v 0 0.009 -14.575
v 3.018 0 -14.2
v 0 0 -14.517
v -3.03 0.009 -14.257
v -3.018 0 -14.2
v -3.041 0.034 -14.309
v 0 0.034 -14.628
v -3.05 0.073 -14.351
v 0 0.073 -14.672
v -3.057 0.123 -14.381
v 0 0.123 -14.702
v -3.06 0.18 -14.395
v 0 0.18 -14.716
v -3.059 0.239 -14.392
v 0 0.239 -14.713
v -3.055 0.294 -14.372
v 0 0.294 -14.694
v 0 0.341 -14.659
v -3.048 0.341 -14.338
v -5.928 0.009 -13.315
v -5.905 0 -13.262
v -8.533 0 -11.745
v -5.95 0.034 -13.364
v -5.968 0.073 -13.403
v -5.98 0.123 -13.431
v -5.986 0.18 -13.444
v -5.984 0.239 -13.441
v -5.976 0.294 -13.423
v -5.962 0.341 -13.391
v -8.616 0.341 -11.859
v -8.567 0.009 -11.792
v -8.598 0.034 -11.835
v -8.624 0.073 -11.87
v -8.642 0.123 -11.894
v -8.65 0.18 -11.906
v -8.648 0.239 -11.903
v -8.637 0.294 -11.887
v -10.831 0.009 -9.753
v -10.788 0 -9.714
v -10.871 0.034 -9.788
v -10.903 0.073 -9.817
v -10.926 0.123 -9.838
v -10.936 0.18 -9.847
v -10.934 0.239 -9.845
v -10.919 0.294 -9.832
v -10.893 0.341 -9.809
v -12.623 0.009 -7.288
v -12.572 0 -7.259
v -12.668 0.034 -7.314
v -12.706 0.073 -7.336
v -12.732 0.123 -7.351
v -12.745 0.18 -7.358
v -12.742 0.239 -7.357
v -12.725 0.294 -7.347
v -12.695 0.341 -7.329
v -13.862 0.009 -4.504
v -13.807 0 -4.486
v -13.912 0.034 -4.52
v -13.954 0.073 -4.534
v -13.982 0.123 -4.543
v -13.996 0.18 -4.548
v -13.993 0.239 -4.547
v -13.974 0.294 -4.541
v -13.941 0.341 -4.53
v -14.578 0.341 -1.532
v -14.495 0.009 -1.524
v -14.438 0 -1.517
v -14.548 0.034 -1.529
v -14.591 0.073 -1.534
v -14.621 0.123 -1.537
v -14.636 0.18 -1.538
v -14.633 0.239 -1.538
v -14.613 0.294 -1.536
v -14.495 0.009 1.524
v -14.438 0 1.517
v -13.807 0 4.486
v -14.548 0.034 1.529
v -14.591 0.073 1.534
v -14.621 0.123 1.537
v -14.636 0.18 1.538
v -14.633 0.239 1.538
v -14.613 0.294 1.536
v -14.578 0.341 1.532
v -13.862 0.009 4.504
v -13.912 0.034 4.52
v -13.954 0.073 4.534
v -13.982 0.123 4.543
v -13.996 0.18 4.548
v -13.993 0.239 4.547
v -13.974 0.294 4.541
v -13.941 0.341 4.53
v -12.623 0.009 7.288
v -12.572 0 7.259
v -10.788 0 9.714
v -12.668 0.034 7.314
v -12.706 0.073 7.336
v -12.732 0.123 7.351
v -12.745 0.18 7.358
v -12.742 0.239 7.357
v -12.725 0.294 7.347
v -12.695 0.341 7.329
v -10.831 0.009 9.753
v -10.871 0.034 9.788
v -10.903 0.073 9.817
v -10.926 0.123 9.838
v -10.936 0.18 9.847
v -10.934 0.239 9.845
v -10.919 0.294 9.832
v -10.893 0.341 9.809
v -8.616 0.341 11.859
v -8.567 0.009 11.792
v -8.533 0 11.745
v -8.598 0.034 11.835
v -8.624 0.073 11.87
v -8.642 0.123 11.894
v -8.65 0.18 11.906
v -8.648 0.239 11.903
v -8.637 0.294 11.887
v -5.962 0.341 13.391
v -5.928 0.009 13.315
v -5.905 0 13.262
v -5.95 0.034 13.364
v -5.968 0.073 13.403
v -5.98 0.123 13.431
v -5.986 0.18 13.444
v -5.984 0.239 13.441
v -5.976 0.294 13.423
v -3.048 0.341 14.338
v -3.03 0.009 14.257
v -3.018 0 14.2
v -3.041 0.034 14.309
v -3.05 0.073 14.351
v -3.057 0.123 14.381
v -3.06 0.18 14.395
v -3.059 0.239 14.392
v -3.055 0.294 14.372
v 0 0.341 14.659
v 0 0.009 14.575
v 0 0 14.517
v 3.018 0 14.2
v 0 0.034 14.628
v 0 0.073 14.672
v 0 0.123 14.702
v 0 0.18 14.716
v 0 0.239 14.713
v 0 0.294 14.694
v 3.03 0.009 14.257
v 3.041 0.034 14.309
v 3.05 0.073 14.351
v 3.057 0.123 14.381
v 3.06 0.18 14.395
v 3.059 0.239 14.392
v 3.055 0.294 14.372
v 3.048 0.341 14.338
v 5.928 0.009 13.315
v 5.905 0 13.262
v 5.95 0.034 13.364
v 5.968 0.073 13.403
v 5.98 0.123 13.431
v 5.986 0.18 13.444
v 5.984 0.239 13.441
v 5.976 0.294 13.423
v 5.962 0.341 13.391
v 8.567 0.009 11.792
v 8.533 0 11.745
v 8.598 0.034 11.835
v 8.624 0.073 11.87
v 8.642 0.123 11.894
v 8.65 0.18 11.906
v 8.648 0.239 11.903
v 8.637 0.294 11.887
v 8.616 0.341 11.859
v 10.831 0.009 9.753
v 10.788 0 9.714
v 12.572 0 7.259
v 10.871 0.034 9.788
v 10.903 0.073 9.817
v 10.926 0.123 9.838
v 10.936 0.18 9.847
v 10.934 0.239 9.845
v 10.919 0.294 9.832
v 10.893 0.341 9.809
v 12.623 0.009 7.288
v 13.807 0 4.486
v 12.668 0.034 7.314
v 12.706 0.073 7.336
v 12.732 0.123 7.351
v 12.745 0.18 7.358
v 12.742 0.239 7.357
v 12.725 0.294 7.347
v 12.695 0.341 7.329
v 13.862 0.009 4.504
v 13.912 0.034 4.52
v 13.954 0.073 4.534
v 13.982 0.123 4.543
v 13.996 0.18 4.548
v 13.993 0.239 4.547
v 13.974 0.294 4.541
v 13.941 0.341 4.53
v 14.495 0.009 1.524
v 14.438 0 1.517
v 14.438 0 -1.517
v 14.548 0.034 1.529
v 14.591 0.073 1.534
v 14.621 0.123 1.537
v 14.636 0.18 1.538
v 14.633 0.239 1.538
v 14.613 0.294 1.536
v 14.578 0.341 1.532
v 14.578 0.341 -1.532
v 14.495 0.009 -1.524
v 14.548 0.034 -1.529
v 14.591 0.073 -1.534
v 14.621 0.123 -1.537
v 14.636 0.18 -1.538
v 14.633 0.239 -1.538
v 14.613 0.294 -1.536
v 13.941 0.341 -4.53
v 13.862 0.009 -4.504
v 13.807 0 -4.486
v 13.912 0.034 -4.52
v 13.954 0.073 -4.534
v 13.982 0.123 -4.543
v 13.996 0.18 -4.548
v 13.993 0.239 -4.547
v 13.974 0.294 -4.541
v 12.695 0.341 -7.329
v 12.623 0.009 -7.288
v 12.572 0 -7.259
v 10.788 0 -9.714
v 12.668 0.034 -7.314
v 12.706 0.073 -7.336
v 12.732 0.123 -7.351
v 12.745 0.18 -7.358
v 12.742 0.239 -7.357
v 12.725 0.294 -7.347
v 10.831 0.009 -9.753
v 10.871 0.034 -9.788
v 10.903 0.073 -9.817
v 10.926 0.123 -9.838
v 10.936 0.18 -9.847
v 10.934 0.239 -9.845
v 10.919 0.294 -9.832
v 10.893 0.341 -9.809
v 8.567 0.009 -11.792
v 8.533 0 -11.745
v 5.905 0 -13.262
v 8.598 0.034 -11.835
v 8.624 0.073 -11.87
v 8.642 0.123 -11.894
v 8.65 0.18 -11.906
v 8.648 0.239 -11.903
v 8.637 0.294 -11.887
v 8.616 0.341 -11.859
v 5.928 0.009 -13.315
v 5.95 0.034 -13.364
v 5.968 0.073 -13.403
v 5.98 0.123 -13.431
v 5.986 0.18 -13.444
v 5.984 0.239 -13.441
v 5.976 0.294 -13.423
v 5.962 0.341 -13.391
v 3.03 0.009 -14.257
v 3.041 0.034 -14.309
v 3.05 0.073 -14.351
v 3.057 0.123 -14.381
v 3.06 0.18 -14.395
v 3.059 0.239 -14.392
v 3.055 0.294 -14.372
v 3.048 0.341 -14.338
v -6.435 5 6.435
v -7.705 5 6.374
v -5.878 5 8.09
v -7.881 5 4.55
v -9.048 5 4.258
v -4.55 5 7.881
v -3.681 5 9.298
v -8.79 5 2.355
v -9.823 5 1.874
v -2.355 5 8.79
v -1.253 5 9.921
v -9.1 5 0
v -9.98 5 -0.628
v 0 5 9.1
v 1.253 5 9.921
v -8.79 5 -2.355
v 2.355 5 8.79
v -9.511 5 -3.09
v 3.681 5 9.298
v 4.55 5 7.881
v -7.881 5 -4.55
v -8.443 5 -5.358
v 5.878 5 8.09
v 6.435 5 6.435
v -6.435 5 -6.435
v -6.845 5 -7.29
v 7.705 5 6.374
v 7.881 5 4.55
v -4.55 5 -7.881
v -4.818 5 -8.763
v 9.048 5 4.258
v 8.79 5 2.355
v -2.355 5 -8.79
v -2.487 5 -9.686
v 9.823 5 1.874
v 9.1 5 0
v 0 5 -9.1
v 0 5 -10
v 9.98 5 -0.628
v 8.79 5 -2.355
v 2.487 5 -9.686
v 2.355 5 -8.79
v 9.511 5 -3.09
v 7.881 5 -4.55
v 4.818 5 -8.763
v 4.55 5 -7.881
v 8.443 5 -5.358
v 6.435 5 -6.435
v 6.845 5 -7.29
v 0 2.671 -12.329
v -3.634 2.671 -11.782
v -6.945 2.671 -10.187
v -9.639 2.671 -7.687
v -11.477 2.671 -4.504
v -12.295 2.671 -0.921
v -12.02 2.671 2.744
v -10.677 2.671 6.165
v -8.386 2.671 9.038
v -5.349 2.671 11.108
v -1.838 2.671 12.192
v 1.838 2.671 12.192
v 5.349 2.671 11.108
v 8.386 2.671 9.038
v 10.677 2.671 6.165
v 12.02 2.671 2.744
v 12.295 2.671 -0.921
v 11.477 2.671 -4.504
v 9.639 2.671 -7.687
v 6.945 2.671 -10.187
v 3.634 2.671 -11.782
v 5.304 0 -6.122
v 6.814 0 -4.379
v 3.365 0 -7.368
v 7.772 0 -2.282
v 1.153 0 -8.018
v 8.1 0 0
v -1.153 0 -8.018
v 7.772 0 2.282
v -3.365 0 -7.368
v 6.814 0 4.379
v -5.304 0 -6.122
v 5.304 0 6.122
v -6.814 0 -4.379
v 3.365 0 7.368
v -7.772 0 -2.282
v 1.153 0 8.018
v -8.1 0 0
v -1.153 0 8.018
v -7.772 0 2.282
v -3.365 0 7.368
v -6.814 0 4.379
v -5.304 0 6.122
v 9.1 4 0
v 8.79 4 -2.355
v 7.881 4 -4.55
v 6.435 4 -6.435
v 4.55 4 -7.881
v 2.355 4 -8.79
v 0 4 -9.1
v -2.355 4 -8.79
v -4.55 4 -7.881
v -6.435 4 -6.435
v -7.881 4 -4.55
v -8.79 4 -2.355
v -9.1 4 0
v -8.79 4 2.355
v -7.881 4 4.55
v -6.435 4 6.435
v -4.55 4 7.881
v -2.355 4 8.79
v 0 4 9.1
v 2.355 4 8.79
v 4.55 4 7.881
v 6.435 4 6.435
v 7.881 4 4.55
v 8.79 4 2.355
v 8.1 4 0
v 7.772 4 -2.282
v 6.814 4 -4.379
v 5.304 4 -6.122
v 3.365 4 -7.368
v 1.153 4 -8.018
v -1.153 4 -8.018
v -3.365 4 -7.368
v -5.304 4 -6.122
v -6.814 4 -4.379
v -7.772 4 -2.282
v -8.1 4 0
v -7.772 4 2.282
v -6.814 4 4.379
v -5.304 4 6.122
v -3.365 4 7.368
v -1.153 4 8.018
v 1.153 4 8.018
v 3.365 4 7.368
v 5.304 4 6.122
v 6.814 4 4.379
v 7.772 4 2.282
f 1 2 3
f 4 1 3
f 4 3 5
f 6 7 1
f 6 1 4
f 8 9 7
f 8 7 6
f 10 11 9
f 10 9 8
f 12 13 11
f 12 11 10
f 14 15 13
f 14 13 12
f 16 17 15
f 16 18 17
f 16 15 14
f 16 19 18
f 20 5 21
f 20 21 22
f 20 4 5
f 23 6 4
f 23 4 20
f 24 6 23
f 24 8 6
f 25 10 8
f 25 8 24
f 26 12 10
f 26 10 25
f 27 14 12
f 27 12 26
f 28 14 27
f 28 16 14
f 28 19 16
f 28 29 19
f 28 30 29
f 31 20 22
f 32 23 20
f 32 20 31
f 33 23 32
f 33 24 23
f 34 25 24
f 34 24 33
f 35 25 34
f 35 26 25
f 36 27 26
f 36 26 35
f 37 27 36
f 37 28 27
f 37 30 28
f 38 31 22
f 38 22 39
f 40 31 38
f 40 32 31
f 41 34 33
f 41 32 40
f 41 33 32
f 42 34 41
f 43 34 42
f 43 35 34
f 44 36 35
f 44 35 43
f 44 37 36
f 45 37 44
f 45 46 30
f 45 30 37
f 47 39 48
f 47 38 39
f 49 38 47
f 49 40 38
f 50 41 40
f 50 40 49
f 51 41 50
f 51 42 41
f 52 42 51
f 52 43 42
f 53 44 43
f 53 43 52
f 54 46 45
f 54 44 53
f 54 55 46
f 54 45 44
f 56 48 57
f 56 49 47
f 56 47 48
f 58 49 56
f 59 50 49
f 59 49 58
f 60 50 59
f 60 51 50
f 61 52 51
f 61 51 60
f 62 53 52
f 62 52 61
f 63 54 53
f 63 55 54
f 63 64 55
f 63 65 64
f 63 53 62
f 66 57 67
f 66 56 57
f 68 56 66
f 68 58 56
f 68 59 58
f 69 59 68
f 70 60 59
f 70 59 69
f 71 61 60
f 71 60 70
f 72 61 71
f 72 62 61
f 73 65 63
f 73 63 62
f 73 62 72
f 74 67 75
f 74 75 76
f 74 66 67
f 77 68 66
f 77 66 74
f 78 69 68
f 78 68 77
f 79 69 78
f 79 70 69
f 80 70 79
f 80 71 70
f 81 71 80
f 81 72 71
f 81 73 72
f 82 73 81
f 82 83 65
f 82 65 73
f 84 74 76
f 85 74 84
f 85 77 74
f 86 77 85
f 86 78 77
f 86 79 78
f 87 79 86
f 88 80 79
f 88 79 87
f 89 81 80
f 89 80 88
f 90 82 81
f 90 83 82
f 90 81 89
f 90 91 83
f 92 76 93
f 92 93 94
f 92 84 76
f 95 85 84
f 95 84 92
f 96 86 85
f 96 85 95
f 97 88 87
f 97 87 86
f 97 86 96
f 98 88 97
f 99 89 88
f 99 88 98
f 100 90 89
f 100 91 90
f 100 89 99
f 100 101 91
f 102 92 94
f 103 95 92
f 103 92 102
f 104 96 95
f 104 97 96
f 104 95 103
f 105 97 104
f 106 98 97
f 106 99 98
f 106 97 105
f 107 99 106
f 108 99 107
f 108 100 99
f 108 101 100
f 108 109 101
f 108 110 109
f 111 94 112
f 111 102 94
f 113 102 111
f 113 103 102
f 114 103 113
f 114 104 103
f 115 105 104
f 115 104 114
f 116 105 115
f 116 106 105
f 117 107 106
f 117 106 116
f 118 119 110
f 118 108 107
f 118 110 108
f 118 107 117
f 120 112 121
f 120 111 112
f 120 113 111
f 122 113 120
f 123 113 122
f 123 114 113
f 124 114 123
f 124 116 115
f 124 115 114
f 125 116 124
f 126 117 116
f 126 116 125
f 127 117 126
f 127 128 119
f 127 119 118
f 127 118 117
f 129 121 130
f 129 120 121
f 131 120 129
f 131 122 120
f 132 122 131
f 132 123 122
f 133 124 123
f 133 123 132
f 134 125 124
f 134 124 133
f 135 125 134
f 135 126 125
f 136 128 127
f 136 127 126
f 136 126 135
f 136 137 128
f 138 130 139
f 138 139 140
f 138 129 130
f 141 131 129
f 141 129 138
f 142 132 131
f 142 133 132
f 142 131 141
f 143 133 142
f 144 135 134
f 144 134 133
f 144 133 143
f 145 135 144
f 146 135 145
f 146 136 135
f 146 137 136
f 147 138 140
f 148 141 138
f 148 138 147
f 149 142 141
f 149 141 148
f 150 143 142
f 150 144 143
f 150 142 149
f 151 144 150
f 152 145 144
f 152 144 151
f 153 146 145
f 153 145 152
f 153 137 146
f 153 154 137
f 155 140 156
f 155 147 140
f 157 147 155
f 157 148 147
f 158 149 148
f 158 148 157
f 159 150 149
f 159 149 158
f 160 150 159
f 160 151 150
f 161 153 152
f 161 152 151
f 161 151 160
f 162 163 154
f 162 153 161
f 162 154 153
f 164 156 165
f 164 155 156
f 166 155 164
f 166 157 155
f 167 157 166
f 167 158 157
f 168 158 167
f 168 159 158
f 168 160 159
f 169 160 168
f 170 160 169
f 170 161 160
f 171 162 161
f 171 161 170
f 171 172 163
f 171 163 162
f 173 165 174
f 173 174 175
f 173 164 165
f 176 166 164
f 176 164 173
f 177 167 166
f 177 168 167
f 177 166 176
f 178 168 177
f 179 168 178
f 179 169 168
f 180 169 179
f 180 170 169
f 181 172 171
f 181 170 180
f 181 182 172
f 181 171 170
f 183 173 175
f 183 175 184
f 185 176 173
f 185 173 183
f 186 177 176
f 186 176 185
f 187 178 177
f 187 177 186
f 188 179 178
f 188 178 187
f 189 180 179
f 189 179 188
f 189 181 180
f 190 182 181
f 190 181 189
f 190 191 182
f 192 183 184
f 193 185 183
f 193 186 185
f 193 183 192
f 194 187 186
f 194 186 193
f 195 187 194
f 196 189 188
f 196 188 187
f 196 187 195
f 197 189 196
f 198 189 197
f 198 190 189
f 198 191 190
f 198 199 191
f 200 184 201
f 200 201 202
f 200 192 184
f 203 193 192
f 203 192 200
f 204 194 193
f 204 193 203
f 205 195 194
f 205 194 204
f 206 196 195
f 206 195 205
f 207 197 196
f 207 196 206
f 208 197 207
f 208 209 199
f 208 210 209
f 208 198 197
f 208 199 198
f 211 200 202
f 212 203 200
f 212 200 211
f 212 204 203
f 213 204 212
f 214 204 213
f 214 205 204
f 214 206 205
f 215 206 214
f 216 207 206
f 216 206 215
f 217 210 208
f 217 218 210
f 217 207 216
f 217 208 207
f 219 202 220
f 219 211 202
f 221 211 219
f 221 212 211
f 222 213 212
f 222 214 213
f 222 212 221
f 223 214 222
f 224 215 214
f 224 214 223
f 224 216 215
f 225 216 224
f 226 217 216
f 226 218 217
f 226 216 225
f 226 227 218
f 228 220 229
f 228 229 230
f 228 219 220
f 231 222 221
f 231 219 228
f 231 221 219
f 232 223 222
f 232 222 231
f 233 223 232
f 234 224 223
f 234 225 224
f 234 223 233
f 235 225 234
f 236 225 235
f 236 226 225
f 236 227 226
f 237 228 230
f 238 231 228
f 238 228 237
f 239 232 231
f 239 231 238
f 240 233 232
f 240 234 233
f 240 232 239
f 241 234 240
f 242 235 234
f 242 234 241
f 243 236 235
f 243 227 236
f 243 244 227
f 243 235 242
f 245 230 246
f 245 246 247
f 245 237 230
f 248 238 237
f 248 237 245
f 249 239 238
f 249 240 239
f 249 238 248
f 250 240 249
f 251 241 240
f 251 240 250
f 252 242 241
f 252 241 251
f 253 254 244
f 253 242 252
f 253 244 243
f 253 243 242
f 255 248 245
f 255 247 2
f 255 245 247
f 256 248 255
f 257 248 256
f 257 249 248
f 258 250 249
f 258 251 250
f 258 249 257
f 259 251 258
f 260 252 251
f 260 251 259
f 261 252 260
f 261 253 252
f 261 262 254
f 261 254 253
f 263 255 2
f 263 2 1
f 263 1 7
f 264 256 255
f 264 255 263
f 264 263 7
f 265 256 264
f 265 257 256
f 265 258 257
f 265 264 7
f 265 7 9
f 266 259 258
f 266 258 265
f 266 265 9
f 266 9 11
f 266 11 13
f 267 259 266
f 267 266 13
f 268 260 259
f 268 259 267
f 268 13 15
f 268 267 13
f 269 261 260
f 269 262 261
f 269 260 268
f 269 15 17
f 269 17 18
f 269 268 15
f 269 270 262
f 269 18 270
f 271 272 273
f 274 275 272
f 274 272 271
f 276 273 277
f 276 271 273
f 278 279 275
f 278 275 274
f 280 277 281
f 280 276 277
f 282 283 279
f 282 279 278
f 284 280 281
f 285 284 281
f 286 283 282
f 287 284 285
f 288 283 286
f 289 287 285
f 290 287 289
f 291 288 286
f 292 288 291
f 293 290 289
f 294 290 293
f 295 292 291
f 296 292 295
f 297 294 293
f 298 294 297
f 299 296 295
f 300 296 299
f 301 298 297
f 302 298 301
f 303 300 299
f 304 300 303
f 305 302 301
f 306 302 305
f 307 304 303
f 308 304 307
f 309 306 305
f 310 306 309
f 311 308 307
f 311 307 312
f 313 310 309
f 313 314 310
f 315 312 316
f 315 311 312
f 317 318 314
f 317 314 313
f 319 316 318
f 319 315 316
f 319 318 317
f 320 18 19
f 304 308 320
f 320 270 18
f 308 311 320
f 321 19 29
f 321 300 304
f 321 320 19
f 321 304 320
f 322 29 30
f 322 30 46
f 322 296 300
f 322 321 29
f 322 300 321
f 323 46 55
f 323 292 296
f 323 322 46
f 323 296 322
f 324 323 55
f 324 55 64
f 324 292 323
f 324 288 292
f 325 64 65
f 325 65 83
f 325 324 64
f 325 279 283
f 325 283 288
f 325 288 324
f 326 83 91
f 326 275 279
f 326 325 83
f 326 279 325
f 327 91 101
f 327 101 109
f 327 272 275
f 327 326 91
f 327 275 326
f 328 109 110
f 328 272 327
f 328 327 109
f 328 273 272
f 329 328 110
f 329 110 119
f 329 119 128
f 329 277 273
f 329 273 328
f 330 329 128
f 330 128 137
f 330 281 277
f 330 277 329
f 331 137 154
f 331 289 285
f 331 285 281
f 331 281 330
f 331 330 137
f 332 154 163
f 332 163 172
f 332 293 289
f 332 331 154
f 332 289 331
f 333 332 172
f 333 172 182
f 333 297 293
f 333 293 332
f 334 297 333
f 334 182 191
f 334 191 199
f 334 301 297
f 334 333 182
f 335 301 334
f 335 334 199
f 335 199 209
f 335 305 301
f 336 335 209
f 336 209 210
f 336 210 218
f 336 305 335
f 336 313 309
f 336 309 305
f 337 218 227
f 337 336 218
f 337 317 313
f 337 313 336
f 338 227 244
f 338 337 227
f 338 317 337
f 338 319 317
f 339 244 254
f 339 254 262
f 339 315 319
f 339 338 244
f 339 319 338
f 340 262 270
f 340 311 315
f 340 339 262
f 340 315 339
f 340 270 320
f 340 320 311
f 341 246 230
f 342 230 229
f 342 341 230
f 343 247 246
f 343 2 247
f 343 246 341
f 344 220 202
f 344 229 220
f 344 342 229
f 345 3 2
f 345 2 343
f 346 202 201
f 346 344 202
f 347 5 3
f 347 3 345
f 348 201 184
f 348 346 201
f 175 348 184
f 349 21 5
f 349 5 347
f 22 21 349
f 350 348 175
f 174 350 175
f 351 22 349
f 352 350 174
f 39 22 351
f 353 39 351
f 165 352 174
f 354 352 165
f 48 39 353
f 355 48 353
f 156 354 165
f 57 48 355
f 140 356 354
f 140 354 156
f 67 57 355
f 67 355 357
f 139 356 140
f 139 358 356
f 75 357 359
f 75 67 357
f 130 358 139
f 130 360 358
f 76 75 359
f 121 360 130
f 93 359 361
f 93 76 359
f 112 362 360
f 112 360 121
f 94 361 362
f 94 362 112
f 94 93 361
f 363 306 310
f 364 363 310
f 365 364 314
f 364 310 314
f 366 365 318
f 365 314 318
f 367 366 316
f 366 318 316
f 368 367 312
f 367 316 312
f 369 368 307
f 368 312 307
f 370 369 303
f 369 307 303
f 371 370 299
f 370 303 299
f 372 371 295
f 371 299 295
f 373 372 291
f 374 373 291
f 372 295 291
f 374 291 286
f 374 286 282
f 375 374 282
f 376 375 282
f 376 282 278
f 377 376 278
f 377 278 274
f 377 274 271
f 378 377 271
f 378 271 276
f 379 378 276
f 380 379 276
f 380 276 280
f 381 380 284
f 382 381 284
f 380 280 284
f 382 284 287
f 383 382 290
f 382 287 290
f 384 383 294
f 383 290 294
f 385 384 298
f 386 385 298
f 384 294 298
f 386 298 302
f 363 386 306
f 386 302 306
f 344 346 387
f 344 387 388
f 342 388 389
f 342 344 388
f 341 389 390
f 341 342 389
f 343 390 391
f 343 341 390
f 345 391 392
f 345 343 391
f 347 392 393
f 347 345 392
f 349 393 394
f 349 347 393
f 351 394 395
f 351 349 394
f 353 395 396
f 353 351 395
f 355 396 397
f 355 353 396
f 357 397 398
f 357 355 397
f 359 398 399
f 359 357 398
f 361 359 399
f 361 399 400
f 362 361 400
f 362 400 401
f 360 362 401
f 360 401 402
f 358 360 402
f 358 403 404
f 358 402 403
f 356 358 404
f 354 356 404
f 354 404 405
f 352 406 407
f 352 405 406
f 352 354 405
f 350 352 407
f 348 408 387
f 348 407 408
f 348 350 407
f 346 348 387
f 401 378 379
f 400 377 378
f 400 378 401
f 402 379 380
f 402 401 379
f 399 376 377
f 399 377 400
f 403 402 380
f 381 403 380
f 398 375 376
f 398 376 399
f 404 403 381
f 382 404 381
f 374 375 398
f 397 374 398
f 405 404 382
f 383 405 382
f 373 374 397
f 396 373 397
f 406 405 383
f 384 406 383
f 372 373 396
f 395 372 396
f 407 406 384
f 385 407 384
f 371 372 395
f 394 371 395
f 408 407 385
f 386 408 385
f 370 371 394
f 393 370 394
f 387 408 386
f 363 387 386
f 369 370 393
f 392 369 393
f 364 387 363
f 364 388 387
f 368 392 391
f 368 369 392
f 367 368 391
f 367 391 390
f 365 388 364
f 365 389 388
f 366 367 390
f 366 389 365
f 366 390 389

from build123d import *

# Parameters (mm, degrees)
SKETCH_1_R          = 10
SKETCH_1_R_2        = 8.1
EXTRUDE_1_DEPTH     = 5
FILLET_1_R          = 0.2
SKETCH_3_R          = 9.1
CUT_EXTRUDE_1_DEPTH = 1


with BuildPart() as part:
    # 草图1 → 凸台-拉伸1 (new body)
    with BuildSketch(Plane(origin=(0, 0, 0), x_dir=(1, 0, 0), z_dir=(0, 1, 0))):
        Circle(SKETCH_1_R)
        Circle(SKETCH_1_R_2, mode=Mode.SUBTRACT)
    extrude(amount=EXTRUDE_1_DEPTH)

    # 草图2 → 旋转1 (revolve)
    with BuildSketch(Plane(origin=(0, 0, 0), x_dir=(0, 0, -1), z_dir=(1, 0, 0))):
        Polygon((10, 5), (10, 0), (15, 0), align=None)
    revolve(axis=Axis((0, 0, 0), (0, 1, 0)))

    # 圆角1
    fillet_1_edges = [part.edges().sort_by_distance(p)[0] for p in [
        (0, 0, 15),
    ]]
    fillet(fillet_1_edges, radius=FILLET_1_R)

    # 草图3 → 切除-拉伸1 (cut)
    with BuildSketch(Plane(origin=(0, 5, 0), x_dir=(1, 0, 0), z_dir=(0, 1, 0))):
        Circle(SKETCH_3_R)
    extrude(amount=-CUT_EXTRUDE_1_DEPTH, mode=Mode.SUBTRACT)


solid = part.part
